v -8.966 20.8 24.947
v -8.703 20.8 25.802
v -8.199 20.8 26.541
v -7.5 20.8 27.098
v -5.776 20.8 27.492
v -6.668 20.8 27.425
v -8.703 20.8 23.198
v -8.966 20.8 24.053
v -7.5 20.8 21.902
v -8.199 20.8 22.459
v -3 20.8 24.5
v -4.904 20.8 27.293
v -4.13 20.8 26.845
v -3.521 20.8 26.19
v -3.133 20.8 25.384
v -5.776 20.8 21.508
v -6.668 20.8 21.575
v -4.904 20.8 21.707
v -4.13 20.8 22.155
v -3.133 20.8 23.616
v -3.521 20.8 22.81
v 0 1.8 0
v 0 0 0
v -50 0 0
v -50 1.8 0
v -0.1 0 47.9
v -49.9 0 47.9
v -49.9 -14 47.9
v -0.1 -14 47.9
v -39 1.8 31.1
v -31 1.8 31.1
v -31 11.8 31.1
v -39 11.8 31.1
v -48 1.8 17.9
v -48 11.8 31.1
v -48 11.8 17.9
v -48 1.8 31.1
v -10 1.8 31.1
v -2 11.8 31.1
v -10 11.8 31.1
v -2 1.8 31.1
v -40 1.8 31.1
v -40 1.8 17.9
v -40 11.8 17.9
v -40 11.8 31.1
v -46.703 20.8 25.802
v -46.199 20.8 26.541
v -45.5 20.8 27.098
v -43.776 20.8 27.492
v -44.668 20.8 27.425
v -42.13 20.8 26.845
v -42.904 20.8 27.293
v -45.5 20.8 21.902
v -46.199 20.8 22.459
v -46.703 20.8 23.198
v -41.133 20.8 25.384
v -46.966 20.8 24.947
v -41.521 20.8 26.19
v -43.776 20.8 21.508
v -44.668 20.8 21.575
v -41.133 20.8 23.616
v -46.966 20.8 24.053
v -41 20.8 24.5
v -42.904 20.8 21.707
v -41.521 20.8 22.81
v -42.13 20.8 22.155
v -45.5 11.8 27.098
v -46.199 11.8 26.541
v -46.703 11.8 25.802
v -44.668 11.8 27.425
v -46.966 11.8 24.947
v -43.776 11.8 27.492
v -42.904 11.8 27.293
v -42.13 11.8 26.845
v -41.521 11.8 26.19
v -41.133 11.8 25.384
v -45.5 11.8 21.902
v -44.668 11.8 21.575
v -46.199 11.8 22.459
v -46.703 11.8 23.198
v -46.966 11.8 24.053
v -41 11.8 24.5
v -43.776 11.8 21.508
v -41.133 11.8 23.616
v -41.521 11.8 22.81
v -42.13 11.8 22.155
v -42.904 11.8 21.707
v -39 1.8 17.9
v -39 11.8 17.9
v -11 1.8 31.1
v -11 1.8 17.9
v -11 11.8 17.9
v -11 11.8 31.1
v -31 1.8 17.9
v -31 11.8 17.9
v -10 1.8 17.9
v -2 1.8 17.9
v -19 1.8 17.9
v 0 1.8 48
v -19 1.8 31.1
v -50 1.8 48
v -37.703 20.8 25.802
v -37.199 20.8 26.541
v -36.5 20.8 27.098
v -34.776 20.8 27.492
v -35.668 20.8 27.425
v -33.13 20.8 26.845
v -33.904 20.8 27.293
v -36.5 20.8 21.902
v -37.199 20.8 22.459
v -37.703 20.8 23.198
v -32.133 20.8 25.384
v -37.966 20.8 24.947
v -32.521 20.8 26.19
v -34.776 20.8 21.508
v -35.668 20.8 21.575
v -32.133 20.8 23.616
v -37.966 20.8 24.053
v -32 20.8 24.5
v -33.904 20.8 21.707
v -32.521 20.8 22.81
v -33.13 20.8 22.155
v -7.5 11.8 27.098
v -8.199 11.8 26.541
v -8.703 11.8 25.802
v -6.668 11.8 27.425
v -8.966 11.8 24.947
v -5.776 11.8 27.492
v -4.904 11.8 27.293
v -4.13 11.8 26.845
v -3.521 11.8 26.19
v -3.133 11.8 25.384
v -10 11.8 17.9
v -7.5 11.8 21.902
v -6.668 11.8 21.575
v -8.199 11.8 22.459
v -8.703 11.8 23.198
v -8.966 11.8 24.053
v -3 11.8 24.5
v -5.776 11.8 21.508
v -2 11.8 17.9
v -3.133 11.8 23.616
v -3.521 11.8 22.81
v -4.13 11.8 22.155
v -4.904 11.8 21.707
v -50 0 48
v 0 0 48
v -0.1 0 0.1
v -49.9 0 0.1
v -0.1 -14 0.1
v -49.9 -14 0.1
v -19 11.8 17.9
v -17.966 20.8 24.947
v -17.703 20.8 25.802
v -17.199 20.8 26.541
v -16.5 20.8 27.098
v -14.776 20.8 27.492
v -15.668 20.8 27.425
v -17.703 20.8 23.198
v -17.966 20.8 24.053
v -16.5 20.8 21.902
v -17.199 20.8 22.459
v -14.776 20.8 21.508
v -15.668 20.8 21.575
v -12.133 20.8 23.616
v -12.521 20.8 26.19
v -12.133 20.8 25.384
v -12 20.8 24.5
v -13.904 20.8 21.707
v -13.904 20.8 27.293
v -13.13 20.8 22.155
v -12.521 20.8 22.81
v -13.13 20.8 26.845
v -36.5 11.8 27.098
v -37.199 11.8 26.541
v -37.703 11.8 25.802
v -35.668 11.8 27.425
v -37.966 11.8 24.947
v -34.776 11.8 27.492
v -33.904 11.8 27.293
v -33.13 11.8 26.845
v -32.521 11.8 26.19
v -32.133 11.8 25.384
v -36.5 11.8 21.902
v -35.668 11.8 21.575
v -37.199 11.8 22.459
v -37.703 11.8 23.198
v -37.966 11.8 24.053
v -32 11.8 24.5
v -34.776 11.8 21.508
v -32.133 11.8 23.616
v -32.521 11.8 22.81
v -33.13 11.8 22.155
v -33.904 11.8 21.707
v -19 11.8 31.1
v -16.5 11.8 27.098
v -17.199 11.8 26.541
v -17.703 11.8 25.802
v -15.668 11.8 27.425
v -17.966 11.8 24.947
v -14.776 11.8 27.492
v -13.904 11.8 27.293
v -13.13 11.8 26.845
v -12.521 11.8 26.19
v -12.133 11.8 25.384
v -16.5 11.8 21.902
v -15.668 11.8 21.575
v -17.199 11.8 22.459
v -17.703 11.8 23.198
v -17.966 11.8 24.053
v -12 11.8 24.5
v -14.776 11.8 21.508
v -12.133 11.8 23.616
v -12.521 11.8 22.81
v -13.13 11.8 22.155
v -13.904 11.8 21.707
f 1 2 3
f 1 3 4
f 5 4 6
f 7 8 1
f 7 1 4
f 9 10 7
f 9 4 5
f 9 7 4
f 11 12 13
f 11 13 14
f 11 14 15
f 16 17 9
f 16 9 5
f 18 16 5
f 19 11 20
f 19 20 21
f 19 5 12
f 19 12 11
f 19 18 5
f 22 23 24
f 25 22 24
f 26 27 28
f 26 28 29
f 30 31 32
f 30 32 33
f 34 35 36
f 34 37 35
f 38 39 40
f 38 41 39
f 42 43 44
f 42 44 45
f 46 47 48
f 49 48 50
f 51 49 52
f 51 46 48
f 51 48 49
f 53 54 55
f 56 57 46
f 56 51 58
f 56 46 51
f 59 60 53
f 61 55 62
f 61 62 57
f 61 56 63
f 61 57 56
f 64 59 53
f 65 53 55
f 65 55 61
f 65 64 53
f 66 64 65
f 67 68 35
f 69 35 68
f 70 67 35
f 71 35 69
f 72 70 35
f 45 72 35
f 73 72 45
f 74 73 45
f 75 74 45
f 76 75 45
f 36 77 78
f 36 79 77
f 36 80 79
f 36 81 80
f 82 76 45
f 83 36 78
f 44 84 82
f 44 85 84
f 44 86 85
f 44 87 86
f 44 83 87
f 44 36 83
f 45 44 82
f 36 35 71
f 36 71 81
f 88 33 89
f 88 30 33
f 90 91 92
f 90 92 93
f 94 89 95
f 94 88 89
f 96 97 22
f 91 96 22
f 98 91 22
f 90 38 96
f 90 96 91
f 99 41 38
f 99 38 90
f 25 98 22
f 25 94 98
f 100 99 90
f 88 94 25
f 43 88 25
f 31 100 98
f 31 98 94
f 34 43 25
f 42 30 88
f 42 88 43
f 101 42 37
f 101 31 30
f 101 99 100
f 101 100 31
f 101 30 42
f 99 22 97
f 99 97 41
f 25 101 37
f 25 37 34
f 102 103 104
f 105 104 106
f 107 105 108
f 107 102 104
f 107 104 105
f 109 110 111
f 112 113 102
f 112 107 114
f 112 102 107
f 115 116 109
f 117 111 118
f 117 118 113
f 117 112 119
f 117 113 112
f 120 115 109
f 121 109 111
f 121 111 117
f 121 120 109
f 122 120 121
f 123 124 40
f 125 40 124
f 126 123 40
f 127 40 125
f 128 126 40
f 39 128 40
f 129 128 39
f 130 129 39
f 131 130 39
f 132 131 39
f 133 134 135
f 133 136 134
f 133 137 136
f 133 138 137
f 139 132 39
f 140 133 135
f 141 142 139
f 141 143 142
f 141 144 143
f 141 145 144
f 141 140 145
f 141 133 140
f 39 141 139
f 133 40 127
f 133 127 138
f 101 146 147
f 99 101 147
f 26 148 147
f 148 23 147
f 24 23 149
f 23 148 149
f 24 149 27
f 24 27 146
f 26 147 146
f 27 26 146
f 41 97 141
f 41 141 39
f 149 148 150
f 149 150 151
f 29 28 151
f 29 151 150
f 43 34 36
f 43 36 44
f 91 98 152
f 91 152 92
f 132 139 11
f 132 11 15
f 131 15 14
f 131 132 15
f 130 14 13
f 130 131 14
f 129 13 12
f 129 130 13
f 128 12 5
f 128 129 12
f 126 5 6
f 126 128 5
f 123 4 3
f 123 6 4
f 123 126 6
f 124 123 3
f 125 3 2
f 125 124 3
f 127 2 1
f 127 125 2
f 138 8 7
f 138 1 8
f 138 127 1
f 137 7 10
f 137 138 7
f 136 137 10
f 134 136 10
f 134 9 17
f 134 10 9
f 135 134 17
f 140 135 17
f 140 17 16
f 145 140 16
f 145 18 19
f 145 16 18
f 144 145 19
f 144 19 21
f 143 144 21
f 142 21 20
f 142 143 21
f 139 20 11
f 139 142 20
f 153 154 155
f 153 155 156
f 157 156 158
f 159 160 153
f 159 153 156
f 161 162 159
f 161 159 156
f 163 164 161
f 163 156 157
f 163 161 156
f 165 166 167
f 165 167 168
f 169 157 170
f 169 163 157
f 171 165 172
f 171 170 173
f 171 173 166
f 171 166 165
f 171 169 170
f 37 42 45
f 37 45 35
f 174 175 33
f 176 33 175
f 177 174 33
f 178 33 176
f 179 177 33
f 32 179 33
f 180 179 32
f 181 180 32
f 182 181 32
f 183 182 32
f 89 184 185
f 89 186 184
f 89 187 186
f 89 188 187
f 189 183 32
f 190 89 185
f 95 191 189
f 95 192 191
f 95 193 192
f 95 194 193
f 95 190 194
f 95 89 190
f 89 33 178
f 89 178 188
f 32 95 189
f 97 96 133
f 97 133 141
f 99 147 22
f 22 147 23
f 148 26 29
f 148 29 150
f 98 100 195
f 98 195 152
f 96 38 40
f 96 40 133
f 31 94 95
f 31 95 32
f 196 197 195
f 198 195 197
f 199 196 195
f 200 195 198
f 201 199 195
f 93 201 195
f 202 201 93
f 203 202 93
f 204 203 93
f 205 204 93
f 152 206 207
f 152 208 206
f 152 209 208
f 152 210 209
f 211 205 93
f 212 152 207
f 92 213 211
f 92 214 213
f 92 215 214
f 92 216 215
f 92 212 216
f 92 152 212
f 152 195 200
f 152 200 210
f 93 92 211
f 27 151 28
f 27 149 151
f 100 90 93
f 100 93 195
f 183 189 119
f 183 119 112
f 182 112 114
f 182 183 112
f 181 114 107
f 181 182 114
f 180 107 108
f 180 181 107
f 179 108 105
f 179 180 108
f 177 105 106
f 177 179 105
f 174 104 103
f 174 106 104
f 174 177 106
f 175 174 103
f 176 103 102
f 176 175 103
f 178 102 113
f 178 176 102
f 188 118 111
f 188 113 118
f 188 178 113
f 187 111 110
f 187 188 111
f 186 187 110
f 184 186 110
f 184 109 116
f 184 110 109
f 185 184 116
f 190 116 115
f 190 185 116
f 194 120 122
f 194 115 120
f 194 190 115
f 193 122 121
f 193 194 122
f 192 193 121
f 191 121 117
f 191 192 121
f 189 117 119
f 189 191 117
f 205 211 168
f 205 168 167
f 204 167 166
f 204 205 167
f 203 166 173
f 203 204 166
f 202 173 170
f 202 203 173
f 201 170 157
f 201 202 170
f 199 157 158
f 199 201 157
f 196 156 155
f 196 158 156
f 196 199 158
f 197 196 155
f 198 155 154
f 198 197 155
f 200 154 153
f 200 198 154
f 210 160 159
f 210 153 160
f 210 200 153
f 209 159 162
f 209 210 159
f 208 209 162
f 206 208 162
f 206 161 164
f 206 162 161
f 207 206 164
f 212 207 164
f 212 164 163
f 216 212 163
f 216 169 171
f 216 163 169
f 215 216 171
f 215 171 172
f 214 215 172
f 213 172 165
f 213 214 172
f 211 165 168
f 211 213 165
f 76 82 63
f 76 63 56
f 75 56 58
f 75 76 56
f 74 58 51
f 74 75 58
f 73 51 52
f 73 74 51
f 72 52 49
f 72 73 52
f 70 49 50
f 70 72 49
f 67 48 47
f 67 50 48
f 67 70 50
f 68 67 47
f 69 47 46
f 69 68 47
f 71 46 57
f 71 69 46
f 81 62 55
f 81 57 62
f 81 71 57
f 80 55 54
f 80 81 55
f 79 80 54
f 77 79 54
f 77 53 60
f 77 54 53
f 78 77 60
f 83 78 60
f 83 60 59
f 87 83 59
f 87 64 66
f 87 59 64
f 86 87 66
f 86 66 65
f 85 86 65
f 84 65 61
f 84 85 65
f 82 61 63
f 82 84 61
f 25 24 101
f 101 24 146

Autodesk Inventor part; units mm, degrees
ref_plane "YZ Plane" through (0, 0, 0) normal (1, 0, 0) x (0, 1, 0)
ref_plane "XZ Plane" through (0, 0, 0) normal (0, 1, 0) x (-1, 0, 0)
ref_plane "XY Plane" through (0, 0, 0) normal (0, 0, 1) x (1, 0, 0)
sketch "Sketch1" plane through (0, 0, 0) normal (0, 1, 0) x (-1, 0, 0)
  line L0 (0, 0) -> (50, 0)
  line L1 (50, 0) -> (50, 48)
  line L2 (50, 48) -> (0, 48)
  line L3 (0, 48) -> (0, 0)
  dimension "d0" = 50
  dimension "d1" = 48
extrude "Extrusion1" add sketch "Sketch1" along normal blind 1.8
sketch "Sketch4" plane through (0, 1.8, 0) normal (0, 1, 0) x (1, 0, 0)
  line L0 (0, 0) -> (-50, 0) projected
  line L1 (-50, 0) -> (-50, -48) projected
  line L2 (-48, -17.9) -> (-40, -17.9)
  line L3 (-40, -17.9) -> (-40, -31.1)
  line L4 (-40, -31.1) -> (-48, -31.1)
  line L5 (-48, -31.1) -> (-48, -17.9)
  line L6 (-44, -24.5) -> (-44, -17.9)
  line L7 (-44, -24.5) -> (-40, -24.5)
  line L8 (-44, -24.5) -> (-44, -31.1)
  line L9 (-44, -24.5) -> (-48, -24.5)
  line L10 (-39, -17.9) -> (-31, -17.9)
  line L11 (-31, -17.9) -> (-31, -31.1)
  line L12 (-31, -31.1) -> (-39, -31.1)
  line L13 (-39, -31.1) -> (-39, -17.9)
  line L14 (-35, -24.5) -> (-35, -17.9)
  line L15 (-35, -24.5) -> (-31, -24.5)
  line L16 (-35, -24.5) -> (-35, -31.1)
  line L17 (-35, -24.5) -> (-39, -24.5)
  line L18 (-19, -17.9) -> (-11, -17.9)
  line L19 (-11, -17.9) -> (-11, -31.1)
  line L20 (-11, -31.1) -> (-19, -31.1)
  line L21 (-19, -31.1) -> (-19, -17.9)
  line L22 (-15, -24.5) -> (-15, -17.9)
  line L23 (-15, -24.5) -> (-11, -24.5)
  line L24 (-15, -24.5) -> (-15, -31.1)
  line L25 (-15, -24.5) -> (-19, -24.5)
  line L26 (-2, -17.9) -> (-2, -31.1)
  line L27 (-6, -24.5) -> (-6, -17.9)
  line L28 (-6, -24.5) -> (-2, -24.5)
  line L29 (-6, -24.5) -> (-6, -31.1)
  line L30 (-2, -31.1) -> (-10, -31.1)
  line L31 (-10, -17.9) -> (-2, -17.9)
  line L32 (-6, -24.5) -> (-10, -24.5)
  line L33 (-10, -31.1) -> (-10, -17.9)
  dimension "d4" = 8
  dimension "d6" = 13.2
  dimension "d7" = 24.5
  dimension "d8" = 6
  dimension "d9" = 8
  dimension "d10" = 13.2
  dimension "d12" = 9
  dimension "d13" = 8
  dimension "d14" = 13.2
  dimension "d15" = 8
  dimension "d16" = 13.2
  dimension "d17" = 20
  dimension "d18" = 9
extrude "Extrusion2" add sketch "Sketch4" along normal blind 10
sketch "Sketch5" plane through (0, 11.8, 0) normal (0, 1, 0) x (1, 0, 0)
  line L0 (-31, -31.1) -> (-31, -17.9) projected
  line L1 (-31, -17.9) -> (-39, -17.9) projected
  line L2 (-39, -17.9) -> (-39, -31.1) projected
  line L3 (-39, -31.1) -> (-31, -31.1) projected
  line L4 (-11, -31.1) -> (-11, -17.9) projected
  line L5 (-11, -17.9) -> (-19, -17.9) projected
  line L6 (-19, -17.9) -> (-19, -31.1) projected
  line L7 (-19, -31.1) -> (-11, -31.1) projected
  line L8 (-2, -17.9) -> (-10, -17.9) projected
  line L9 (-10, -17.9) -> (-10, -31.1) projected
  line L10 (-10, -31.1) -> (-2, -31.1) projected
  line L11 (-2, -31.1) -> (-2, -17.9) projected
  circle A0 centre (-44, -24.5) radius 3
  circle A1 centre (-35, -24.5) radius 3
  circle A2 centre (-15, -24.5) radius 3
  circle A3 centre (-6, -24.5) radius 3
  point P0 (0, 0)
  dimension "d21" = 6
  dimension "d23" = 6
  dimension "d24" = 6
  dimension "d25" = 6
extrude "Extrusion3" add sketch "Sketch5" along normal blind 9 contours A0 | A1 | A2 | A3
sketch "Sketch6" plane through (0, 0, 0) normal (0, -1, 0) x (1, 0, 0)
  line L0 (0, 0) -> (-50, 0) projected
  line L1 (0, 48) -> (0, 0) projected
  line L2 (-50, 48) -> (0, 48) projected
  line L3 (-50, 0) -> (-50, 48) projected
  line L4 (-0.1, 47.9) -> (-0.1, 0.1)
  line L5 (-0.1, 0.1) -> (-49.9, 0.1)
  line L6 (-49.9, 0.1) -> (-49.9, 47.9)
  line L7 (-49.9, 47.9) -> (-0.1, 47.9)
  dimension "d28" = 0.1
extrude "Extrusion4" add sketch "Sketch6" along normal blind 14 contours L4 L5 L6 L7
properties part number "ccpdu"
